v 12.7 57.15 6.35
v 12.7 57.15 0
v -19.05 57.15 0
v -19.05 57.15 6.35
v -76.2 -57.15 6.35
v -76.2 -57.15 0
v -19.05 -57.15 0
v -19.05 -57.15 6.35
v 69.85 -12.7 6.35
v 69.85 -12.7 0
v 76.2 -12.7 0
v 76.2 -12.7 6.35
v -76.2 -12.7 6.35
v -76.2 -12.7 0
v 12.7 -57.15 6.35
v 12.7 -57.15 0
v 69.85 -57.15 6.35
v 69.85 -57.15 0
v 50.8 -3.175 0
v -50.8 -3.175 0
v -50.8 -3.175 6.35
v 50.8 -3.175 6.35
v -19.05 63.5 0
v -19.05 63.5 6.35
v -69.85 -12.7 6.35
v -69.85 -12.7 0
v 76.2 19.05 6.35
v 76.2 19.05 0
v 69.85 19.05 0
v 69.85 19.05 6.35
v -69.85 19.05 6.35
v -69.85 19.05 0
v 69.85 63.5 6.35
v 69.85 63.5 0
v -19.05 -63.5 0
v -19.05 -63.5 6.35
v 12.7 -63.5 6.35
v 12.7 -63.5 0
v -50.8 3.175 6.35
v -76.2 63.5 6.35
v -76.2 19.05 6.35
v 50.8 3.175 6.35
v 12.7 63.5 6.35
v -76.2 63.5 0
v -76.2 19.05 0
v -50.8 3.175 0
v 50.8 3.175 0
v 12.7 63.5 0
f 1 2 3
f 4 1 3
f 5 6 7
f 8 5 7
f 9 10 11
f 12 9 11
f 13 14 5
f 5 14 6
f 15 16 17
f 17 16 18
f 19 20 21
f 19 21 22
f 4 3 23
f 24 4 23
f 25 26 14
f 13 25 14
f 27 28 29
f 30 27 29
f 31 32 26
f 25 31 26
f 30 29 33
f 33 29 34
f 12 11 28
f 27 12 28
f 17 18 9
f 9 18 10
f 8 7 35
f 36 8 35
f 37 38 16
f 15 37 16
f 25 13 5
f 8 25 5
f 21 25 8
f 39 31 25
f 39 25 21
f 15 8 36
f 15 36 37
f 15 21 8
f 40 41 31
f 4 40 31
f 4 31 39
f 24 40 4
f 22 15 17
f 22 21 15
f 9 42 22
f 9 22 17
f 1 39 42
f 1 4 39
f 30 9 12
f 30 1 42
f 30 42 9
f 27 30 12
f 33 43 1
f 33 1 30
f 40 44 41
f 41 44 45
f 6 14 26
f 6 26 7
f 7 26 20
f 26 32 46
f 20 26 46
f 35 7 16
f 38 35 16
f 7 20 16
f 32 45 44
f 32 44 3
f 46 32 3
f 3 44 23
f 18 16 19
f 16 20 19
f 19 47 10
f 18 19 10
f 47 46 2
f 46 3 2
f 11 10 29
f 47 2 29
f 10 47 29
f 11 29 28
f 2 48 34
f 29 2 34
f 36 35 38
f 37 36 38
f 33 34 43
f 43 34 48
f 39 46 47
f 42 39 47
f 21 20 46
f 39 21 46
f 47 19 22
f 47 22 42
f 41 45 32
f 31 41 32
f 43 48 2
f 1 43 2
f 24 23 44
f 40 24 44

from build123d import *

# Parameters (mm, degrees)
F0_W     = 101.6
F0_H     = 6.35
F1_DEPTH = 6.35


with BuildPart() as f1:
    # F0 (on Top) → F1 (new body)
    with BuildSketch(Plane.XY):
        Polygon((-63.5, 63.5), (-76.2, 63.5), (-76.2, 57.15), (-76.2, 50.8), (-76.2, 44.45), (-76.2, 38.1), (-76.2, 31.75), (-76.2, 25.4), (-76.2, 19.05), (-69.85, 19.05), (-69.85, 12.7), (-69.85, 6.35), (-69.85, 0), (-69.85, -6.35), (-69.85, -12.7), (-76.2, -12.7), (-76.2, -19.05), (-76.2, -25.4), (-76.2, -31.75), (-76.2, -38.1), (-76.2, -44.45), (-76.2, -50.8), (-76.2, -57.15), (-69.85, -57.15), (-63.5, -57.15), (-57.15, -57.15), (-50.8, -57.15), (-44.45, -57.15), (-38.1, -57.15), (-31.75, -57.15), (-25.4, -57.15), (-19.05, -57.15), (-19.05, -63.5), (-12.7, -63.5), (-6.35, -63.5), (0, -63.5), (6.35, -63.5), (12.7, -63.5), (12.7, -57.15), (19.05, -57.15), (25.4, -57.15), (31.75, -57.15), (38.1, -57.15), (44.45, -57.15), (50.8, -57.15), (57.15, -57.15), (63.5, -57.15), (69.85, -57.15), (69.85, -50.8), (69.85, -44.45), (69.85, -38.1), (69.85, -31.75), (69.85, -25.4), (69.85, -19.05), (69.85, -12.7), (76.2, -12.7), (76.2, -6.35), (76.2, 0), (76.2, 6.35), (76.2, 12.7), (76.2, 19.05), (69.85, 19.05), (69.85, 25.4), (69.85, 31.75), (69.85, 38.1), (69.85, 44.45), (69.85, 50.8), (69.85, 63.5), (63.5, 63.5), (57.15, 63.5), (50.8, 63.5), (44.45, 63.5), (38.1, 63.5), (31.75, 63.5), (25.4, 63.5), (19.05, 63.5), (12.7, 63.5), (12.7, 57.15), (6.35, 57.15), (0, 57.15), (-6.35, 57.15), (-12.7, 57.15), (-19.05, 57.15), (-19.05, 63.5), (-25.4, 63.5), (-31.75, 63.5), (-38.1, 63.5), (-44.45, 63.5), (-50.8, 63.5), (-57.15, 63.5), align=None)
        Rectangle(F0_W, F0_H, mode=Mode.SUBTRACT)
    extrude(amount=F1_DEPTH)


solid = f1.part
